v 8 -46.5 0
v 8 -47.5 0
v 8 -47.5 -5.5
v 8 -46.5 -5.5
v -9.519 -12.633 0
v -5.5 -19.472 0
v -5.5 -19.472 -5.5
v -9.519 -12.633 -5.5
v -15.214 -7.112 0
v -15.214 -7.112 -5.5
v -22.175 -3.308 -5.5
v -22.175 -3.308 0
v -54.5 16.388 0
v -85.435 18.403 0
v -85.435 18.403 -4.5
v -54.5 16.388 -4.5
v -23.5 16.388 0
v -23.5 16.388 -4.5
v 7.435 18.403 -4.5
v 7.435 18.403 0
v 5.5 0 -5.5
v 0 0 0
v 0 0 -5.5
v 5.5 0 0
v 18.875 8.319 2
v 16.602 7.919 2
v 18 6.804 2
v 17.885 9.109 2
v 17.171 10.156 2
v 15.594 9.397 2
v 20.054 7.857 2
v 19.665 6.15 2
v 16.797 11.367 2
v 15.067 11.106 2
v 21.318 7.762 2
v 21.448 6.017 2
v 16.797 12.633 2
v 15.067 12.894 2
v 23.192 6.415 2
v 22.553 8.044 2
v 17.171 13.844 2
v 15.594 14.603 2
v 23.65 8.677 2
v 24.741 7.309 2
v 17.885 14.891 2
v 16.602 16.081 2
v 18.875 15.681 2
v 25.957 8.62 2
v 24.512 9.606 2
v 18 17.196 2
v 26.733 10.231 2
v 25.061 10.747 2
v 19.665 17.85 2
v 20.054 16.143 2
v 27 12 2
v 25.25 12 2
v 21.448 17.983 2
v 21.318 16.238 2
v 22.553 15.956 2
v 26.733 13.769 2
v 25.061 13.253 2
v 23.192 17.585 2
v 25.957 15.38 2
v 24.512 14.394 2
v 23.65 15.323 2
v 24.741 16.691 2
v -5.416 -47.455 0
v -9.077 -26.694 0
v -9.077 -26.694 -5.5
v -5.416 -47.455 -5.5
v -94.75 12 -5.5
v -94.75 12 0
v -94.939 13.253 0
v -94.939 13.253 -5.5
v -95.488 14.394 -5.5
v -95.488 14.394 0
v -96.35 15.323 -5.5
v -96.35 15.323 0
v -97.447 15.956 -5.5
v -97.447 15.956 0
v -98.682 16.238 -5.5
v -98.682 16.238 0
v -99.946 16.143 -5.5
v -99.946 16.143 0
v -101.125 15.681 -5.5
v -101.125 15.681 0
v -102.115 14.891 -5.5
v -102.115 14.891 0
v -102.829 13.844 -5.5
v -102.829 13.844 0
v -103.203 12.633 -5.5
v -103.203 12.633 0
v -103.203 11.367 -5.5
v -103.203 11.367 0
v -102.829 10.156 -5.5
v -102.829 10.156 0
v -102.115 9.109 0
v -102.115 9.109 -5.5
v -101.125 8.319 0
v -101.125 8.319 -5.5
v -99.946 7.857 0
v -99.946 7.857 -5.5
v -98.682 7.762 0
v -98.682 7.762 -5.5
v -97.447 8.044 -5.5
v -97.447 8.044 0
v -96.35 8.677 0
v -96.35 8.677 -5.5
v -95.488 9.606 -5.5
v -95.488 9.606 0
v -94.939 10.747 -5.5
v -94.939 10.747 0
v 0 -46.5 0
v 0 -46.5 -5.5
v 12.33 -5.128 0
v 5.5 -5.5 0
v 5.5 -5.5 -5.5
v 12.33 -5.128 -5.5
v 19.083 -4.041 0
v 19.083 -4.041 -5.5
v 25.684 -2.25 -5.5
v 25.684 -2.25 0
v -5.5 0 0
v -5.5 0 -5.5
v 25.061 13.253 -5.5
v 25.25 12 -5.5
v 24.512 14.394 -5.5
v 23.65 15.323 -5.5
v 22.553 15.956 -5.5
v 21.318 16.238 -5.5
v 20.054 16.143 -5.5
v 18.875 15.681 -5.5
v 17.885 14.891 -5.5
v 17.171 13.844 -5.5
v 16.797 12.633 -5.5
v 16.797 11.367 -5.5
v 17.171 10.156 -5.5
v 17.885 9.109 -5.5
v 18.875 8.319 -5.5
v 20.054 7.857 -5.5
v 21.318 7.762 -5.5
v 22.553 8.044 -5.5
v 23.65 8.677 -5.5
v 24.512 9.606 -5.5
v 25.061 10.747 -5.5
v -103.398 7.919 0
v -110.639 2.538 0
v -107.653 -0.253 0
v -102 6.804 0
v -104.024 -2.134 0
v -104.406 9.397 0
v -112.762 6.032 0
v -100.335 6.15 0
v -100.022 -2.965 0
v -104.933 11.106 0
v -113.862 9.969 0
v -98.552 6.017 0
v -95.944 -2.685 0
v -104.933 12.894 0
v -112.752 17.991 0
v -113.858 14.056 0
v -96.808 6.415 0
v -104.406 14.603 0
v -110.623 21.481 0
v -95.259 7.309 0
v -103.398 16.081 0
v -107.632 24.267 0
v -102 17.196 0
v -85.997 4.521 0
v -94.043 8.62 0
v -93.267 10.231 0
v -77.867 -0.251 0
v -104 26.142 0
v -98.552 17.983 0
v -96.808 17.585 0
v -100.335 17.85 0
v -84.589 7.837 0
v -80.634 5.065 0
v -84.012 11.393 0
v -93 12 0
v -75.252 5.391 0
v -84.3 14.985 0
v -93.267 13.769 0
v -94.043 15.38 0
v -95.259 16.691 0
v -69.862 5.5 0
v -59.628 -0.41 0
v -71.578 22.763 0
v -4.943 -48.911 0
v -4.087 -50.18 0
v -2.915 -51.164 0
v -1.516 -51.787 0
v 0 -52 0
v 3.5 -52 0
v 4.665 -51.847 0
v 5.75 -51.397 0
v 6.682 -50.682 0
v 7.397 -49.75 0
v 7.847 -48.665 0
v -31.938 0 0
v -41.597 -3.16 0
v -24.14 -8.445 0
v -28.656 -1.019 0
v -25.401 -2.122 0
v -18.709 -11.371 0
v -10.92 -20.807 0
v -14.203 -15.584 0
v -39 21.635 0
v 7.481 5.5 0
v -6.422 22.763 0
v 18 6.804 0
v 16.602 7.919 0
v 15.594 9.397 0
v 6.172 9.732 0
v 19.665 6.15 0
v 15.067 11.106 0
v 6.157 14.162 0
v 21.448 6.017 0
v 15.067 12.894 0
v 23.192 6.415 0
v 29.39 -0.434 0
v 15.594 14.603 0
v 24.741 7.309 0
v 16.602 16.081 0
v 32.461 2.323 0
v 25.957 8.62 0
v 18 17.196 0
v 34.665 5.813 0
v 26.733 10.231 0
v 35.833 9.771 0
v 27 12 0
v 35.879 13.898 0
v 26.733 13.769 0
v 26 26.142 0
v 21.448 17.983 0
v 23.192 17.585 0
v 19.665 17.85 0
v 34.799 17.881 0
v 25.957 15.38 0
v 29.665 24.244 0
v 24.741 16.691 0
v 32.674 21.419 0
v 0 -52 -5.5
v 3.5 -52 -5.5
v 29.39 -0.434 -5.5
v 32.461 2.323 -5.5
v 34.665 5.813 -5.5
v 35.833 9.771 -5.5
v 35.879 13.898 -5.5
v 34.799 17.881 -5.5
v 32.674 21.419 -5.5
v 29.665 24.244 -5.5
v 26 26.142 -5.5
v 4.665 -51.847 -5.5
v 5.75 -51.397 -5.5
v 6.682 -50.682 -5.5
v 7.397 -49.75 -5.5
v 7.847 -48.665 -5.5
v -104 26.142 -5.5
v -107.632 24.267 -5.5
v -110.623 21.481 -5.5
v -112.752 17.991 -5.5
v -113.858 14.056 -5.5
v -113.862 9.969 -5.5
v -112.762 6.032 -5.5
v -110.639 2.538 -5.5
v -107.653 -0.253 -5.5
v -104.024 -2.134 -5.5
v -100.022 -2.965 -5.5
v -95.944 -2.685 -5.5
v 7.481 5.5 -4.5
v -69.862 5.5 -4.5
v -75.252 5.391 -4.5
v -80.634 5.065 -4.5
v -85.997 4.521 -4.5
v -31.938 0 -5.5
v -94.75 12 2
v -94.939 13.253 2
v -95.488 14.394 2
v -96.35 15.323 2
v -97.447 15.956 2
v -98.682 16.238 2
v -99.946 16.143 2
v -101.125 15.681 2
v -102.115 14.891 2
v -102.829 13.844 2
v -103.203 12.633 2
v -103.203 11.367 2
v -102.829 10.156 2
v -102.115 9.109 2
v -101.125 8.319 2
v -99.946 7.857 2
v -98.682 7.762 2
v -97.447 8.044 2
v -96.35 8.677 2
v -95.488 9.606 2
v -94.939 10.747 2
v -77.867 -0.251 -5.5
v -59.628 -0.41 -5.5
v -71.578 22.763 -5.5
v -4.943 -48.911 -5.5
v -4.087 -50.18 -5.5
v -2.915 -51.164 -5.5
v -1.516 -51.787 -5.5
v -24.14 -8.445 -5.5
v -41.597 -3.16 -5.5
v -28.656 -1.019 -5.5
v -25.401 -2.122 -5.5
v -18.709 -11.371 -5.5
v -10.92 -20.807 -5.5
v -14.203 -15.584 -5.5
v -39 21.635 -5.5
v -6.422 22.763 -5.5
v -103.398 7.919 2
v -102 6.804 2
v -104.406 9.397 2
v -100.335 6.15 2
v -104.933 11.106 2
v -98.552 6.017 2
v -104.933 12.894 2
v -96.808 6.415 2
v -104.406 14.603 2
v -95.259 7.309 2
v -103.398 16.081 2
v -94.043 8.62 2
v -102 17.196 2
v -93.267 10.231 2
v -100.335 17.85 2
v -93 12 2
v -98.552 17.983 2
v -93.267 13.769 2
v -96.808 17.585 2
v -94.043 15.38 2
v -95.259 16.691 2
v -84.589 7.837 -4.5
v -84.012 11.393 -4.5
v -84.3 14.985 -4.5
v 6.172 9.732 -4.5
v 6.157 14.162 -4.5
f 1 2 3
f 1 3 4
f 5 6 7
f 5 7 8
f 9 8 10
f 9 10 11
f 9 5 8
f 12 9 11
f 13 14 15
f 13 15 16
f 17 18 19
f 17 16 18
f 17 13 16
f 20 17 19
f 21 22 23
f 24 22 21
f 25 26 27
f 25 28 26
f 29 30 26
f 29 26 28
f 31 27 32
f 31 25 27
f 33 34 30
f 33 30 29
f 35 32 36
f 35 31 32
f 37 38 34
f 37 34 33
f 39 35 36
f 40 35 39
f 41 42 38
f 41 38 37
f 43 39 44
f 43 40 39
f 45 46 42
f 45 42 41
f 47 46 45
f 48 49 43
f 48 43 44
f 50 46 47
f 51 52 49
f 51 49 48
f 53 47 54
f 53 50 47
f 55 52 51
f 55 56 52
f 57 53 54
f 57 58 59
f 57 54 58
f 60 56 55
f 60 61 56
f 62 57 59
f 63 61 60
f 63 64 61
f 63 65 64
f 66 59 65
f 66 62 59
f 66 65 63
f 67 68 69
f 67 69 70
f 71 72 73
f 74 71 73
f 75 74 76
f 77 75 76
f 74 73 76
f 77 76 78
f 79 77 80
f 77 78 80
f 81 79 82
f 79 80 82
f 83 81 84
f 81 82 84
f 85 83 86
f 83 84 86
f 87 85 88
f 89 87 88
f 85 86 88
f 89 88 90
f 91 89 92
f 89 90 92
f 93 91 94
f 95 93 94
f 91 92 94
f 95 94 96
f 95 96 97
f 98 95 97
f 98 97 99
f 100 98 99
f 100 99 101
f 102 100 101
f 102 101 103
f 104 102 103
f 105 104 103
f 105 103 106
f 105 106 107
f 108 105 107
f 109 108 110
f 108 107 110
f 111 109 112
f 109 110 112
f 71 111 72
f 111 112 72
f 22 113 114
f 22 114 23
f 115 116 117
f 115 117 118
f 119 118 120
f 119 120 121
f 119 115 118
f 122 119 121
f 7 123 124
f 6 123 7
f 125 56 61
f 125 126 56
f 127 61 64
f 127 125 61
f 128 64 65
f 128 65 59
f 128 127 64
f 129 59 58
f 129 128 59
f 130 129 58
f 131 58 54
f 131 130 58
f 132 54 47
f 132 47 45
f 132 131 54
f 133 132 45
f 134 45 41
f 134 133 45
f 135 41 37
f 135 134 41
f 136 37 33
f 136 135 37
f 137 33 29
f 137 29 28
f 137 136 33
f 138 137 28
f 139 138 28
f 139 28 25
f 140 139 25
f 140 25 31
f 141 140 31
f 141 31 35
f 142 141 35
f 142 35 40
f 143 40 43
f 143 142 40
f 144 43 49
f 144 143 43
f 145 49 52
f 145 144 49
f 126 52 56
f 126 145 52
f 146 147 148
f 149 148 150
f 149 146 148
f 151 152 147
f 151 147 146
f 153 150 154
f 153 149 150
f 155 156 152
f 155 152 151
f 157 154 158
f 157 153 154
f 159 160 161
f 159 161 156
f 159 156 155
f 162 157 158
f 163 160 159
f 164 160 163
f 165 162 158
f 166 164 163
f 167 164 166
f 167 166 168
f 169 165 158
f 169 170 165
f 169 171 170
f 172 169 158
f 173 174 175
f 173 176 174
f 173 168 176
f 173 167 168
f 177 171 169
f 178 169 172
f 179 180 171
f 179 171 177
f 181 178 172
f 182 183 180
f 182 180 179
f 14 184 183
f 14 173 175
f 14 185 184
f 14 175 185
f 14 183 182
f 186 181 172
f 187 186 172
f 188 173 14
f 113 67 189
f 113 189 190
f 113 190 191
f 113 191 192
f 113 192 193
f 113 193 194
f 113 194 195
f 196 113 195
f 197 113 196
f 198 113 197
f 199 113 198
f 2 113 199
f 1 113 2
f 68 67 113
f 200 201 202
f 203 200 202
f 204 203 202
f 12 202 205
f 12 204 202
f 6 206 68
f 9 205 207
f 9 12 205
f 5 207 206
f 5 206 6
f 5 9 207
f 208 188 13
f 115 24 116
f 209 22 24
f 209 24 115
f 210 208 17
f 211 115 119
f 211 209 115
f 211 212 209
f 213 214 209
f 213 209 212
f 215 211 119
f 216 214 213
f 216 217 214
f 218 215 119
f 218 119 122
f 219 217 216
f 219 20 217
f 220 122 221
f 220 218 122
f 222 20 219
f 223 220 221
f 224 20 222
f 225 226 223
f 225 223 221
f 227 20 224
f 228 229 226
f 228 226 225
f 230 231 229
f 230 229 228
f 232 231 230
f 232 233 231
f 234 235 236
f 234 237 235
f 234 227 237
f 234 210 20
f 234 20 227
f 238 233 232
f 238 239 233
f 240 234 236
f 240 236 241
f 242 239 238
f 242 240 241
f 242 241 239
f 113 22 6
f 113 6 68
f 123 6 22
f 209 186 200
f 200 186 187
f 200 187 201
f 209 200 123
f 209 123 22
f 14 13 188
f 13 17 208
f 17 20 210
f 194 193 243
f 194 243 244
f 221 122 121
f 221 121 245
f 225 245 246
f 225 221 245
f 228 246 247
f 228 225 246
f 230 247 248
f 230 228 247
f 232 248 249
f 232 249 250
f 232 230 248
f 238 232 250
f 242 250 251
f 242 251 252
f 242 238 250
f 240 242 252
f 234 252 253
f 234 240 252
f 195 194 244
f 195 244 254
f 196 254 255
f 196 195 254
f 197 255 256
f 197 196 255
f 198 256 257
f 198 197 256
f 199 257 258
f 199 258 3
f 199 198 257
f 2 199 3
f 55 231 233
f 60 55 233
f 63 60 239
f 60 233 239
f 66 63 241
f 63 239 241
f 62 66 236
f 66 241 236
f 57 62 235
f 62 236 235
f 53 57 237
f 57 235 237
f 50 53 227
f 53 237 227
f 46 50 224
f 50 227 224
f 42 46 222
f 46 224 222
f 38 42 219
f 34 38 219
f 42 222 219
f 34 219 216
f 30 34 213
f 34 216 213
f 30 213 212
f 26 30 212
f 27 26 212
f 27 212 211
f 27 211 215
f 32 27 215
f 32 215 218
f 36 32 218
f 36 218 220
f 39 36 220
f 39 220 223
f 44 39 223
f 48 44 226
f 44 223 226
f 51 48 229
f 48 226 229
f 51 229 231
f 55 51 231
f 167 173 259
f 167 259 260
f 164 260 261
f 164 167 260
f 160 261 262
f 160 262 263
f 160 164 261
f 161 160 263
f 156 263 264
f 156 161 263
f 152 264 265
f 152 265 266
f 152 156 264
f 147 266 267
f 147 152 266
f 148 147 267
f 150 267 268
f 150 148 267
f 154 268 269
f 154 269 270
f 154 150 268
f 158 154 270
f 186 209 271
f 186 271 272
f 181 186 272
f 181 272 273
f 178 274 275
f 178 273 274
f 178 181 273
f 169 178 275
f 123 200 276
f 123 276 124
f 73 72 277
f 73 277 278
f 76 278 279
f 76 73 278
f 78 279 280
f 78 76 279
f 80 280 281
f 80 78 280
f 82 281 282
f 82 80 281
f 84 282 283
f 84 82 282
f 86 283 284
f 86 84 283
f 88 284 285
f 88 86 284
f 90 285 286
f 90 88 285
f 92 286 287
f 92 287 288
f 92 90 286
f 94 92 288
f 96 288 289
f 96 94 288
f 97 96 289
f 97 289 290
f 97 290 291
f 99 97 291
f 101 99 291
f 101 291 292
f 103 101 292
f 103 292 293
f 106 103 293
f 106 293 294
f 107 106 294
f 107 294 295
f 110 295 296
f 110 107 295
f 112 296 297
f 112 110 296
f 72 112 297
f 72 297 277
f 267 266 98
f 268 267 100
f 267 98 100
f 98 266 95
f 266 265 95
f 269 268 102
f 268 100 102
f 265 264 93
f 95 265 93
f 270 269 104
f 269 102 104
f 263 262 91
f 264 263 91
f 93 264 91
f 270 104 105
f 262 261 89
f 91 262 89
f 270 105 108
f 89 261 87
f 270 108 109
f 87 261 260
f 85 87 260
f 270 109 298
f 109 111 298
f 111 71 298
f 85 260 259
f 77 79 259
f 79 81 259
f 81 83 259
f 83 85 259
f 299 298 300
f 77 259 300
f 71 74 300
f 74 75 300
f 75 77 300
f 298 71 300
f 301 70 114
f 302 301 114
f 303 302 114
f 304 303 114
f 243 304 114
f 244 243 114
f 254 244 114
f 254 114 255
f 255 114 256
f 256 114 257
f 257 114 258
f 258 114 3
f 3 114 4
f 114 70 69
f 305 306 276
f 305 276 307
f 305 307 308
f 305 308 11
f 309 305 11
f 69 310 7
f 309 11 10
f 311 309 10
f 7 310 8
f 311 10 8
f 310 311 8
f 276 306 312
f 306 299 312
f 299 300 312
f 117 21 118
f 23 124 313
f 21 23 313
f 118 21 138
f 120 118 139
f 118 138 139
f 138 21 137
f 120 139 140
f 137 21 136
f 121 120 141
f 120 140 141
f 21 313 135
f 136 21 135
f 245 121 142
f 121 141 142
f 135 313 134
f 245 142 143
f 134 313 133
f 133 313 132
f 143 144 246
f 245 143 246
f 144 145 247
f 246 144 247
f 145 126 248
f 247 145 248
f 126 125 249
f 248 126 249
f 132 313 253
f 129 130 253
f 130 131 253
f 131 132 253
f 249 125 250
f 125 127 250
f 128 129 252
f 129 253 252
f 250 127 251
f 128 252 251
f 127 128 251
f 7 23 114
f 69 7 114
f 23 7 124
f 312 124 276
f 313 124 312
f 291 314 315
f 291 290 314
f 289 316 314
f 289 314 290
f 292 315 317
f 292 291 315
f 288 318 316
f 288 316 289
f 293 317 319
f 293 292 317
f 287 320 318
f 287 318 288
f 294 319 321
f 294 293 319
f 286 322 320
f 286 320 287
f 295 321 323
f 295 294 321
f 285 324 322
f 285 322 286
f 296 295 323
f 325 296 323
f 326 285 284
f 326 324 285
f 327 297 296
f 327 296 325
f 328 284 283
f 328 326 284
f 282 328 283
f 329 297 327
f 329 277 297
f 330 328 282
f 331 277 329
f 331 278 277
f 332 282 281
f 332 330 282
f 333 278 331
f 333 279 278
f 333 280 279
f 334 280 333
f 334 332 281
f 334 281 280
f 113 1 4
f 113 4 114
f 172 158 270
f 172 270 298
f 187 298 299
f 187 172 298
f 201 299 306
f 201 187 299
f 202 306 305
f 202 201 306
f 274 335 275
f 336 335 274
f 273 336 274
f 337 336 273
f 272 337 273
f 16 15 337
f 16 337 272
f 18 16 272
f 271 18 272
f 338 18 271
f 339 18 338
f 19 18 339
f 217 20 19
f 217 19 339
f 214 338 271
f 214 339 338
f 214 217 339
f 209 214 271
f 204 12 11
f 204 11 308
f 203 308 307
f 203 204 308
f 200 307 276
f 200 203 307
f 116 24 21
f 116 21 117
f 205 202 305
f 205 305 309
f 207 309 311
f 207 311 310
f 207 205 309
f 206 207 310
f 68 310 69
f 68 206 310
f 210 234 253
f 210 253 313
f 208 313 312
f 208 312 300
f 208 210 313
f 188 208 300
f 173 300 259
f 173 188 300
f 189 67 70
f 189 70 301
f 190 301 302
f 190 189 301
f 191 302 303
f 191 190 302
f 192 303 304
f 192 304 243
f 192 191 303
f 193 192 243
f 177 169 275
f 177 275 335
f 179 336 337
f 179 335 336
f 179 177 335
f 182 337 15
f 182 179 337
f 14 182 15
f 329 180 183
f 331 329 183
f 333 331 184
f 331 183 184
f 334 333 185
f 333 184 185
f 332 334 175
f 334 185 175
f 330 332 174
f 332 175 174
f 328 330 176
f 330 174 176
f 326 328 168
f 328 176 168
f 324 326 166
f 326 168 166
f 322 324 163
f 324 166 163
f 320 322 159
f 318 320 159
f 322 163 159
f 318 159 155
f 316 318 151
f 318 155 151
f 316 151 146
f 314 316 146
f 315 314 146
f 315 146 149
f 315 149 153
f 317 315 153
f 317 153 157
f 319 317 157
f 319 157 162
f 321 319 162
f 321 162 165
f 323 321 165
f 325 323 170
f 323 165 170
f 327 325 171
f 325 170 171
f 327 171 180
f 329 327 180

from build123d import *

# Parameters (mm, degrees)
F0_R     = 6
F0_R_2   = 4.25
F1_DEPTH = 5.5
F2_DEPTH = 2
F3_START = -4.5
F3_DEPTH = 1


with BuildPart() as f1:
    # F0 (on Top) → F1 (new body)
    with BuildSketch(Plane.XY):
        with BuildLine():
            ThreePointArc((5.5, -5.5), (15.7204938899, -4.6734816568), (25.6838378205, -2.2499706411))
            ThreePointArc((25.6838378205, -2.2499706411), (35.9990700802, 11.8329768619), (26, 26.1421356237))
            ThreePointArc((26, 26.1421356237), (-39, 21.6354367546), (-104, 26.1421356237))
            ThreePointArc((-104, 26.1421356237), (-113.4464485518, 7.9626587659), (-95.9436079124, -2.6853146853))
            ThreePointArc((-95.9436079124, -2.6853146853), (-59.6280544783, -0.4098034124), (-24.1395420925, -8.4449052422))
            ThreePointArc((-24.1395420925, -8.4449052422), (-14.2030574813, -15.5841269769), (-9.0771910213, -26.6939292452))
            Line((-9.0771910213, -26.6939292452), (-5.4164426416, -47.4550649772))
            ThreePointArc((-5.4164426416, -47.4550649772), (-3.5353318533, -50.7132444372), (0, -52))
            Line((0, -52), (3.5, -52))
            ThreePointArc((3.5, -52), (6.6819805153, -50.6819805153), (8, -47.5))
            Line((8, -47.5), (8, -46.5))
            Line((8, -46.5), (0, -46.5))
            Line((0, -46.5), (0, 0))
            Line((0, 0), (5.5, 0))
            Line((5.5, 0), (5.5, -5.5))
        make_face()
        with Locations((-99, 12)):
            Circle(F0_R, mode=Mode.SUBTRACT)
        with BuildLine():
            ThreePointArc((-69.8623954313, 5.5), (-77.9446739329, 5.2551191295), (-85.9973015672, 4.5213748947))
            ThreePointArc((-85.9973015672, 4.5213748947), (-84.0122690324, 11.3934355406), (-85.4354846008, 18.4034304857))
            ThreePointArc((-85.4354846008, 18.4034304857), (-39, 16.1354367546), (7.4354846008, 18.4034304857))
            ThreePointArc((7.4354846008, 18.4034304857), (6.0000953549, 11.9465150696), (7.4814941654, 5.5))
            Line((7.4814941654, 5.5), (-69.8623954313, 5.5))
        make_face(mode=Mode.SUBTRACT)
        with BuildLine():
            ThreePointArc((-5.4999999702, -19.4717688181), (-12.1799362134, -9.6798741804), (-22.1748882381, -3.3077722643))
            ThreePointArc((-22.1748882381, -3.3077722643), (-27.0245699268, -1.559616), (-31.9381287937, 0))
            Line((-31.9381287937, 0), (-5.4999999702, 0))
            Line((-5.4999999702, 0), (-5.4999999702, -19.4717688181))
        make_face(mode=Mode.SUBTRACT)
        with Locations((21, 12)):
            Circle(F0_R, mode=Mode.SUBTRACT)
        with Locations((21, 12)):
            Circle(F0_R)
        with Locations((21, 12)):
            Circle(F0_R_2, mode=Mode.SUBTRACT)
        with Locations((-99, 12)):
            Circle(F0_R)
        with Locations((-99, 12)):
            Circle(F0_R_2, mode=Mode.SUBTRACT)
    extrude(amount=-F1_DEPTH)

    # F0 (on Top) → F2 (join)
    with BuildSketch(Plane.XY):
        with Locations((21, 12)):
            Circle(F0_R)
        with Locations((21, 12)):
            Circle(F0_R_2, mode=Mode.SUBTRACT)
        with Locations((-99, 12)):
            Circle(F0_R)
        with Locations((-99, 12)):
            Circle(F0_R_2, mode=Mode.SUBTRACT)
    extrude(amount=F2_DEPTH)

    # F0 (on Top) → F3 (join)
    with BuildSketch(Plane.XY.offset(F3_START)):
        with BuildLine():
            ThreePointArc((-85.4354846008, 18.4034304857), (-84.0122690324, 11.3934355406), (-85.9973015672, 4.5213748947))
            ThreePointArc((-85.9973015672, 4.5213748947), (-77.9446739329, 5.2551191295), (-69.8623954313, 5.5))
            Line((-69.8623954313, 5.5), (7.4814941654, 5.5))
            ThreePointArc((7.4814941654, 5.5), (6.0000953549, 11.9465150696), (7.4354846008, 18.4034304857))
            ThreePointArc((7.4354846008, 18.4034304857), (-39, 16.1354367546), (-85.4354846008, 18.4034304857))
        make_face()
    extrude(amount=-F3_DEPTH)


solid = f1.part
